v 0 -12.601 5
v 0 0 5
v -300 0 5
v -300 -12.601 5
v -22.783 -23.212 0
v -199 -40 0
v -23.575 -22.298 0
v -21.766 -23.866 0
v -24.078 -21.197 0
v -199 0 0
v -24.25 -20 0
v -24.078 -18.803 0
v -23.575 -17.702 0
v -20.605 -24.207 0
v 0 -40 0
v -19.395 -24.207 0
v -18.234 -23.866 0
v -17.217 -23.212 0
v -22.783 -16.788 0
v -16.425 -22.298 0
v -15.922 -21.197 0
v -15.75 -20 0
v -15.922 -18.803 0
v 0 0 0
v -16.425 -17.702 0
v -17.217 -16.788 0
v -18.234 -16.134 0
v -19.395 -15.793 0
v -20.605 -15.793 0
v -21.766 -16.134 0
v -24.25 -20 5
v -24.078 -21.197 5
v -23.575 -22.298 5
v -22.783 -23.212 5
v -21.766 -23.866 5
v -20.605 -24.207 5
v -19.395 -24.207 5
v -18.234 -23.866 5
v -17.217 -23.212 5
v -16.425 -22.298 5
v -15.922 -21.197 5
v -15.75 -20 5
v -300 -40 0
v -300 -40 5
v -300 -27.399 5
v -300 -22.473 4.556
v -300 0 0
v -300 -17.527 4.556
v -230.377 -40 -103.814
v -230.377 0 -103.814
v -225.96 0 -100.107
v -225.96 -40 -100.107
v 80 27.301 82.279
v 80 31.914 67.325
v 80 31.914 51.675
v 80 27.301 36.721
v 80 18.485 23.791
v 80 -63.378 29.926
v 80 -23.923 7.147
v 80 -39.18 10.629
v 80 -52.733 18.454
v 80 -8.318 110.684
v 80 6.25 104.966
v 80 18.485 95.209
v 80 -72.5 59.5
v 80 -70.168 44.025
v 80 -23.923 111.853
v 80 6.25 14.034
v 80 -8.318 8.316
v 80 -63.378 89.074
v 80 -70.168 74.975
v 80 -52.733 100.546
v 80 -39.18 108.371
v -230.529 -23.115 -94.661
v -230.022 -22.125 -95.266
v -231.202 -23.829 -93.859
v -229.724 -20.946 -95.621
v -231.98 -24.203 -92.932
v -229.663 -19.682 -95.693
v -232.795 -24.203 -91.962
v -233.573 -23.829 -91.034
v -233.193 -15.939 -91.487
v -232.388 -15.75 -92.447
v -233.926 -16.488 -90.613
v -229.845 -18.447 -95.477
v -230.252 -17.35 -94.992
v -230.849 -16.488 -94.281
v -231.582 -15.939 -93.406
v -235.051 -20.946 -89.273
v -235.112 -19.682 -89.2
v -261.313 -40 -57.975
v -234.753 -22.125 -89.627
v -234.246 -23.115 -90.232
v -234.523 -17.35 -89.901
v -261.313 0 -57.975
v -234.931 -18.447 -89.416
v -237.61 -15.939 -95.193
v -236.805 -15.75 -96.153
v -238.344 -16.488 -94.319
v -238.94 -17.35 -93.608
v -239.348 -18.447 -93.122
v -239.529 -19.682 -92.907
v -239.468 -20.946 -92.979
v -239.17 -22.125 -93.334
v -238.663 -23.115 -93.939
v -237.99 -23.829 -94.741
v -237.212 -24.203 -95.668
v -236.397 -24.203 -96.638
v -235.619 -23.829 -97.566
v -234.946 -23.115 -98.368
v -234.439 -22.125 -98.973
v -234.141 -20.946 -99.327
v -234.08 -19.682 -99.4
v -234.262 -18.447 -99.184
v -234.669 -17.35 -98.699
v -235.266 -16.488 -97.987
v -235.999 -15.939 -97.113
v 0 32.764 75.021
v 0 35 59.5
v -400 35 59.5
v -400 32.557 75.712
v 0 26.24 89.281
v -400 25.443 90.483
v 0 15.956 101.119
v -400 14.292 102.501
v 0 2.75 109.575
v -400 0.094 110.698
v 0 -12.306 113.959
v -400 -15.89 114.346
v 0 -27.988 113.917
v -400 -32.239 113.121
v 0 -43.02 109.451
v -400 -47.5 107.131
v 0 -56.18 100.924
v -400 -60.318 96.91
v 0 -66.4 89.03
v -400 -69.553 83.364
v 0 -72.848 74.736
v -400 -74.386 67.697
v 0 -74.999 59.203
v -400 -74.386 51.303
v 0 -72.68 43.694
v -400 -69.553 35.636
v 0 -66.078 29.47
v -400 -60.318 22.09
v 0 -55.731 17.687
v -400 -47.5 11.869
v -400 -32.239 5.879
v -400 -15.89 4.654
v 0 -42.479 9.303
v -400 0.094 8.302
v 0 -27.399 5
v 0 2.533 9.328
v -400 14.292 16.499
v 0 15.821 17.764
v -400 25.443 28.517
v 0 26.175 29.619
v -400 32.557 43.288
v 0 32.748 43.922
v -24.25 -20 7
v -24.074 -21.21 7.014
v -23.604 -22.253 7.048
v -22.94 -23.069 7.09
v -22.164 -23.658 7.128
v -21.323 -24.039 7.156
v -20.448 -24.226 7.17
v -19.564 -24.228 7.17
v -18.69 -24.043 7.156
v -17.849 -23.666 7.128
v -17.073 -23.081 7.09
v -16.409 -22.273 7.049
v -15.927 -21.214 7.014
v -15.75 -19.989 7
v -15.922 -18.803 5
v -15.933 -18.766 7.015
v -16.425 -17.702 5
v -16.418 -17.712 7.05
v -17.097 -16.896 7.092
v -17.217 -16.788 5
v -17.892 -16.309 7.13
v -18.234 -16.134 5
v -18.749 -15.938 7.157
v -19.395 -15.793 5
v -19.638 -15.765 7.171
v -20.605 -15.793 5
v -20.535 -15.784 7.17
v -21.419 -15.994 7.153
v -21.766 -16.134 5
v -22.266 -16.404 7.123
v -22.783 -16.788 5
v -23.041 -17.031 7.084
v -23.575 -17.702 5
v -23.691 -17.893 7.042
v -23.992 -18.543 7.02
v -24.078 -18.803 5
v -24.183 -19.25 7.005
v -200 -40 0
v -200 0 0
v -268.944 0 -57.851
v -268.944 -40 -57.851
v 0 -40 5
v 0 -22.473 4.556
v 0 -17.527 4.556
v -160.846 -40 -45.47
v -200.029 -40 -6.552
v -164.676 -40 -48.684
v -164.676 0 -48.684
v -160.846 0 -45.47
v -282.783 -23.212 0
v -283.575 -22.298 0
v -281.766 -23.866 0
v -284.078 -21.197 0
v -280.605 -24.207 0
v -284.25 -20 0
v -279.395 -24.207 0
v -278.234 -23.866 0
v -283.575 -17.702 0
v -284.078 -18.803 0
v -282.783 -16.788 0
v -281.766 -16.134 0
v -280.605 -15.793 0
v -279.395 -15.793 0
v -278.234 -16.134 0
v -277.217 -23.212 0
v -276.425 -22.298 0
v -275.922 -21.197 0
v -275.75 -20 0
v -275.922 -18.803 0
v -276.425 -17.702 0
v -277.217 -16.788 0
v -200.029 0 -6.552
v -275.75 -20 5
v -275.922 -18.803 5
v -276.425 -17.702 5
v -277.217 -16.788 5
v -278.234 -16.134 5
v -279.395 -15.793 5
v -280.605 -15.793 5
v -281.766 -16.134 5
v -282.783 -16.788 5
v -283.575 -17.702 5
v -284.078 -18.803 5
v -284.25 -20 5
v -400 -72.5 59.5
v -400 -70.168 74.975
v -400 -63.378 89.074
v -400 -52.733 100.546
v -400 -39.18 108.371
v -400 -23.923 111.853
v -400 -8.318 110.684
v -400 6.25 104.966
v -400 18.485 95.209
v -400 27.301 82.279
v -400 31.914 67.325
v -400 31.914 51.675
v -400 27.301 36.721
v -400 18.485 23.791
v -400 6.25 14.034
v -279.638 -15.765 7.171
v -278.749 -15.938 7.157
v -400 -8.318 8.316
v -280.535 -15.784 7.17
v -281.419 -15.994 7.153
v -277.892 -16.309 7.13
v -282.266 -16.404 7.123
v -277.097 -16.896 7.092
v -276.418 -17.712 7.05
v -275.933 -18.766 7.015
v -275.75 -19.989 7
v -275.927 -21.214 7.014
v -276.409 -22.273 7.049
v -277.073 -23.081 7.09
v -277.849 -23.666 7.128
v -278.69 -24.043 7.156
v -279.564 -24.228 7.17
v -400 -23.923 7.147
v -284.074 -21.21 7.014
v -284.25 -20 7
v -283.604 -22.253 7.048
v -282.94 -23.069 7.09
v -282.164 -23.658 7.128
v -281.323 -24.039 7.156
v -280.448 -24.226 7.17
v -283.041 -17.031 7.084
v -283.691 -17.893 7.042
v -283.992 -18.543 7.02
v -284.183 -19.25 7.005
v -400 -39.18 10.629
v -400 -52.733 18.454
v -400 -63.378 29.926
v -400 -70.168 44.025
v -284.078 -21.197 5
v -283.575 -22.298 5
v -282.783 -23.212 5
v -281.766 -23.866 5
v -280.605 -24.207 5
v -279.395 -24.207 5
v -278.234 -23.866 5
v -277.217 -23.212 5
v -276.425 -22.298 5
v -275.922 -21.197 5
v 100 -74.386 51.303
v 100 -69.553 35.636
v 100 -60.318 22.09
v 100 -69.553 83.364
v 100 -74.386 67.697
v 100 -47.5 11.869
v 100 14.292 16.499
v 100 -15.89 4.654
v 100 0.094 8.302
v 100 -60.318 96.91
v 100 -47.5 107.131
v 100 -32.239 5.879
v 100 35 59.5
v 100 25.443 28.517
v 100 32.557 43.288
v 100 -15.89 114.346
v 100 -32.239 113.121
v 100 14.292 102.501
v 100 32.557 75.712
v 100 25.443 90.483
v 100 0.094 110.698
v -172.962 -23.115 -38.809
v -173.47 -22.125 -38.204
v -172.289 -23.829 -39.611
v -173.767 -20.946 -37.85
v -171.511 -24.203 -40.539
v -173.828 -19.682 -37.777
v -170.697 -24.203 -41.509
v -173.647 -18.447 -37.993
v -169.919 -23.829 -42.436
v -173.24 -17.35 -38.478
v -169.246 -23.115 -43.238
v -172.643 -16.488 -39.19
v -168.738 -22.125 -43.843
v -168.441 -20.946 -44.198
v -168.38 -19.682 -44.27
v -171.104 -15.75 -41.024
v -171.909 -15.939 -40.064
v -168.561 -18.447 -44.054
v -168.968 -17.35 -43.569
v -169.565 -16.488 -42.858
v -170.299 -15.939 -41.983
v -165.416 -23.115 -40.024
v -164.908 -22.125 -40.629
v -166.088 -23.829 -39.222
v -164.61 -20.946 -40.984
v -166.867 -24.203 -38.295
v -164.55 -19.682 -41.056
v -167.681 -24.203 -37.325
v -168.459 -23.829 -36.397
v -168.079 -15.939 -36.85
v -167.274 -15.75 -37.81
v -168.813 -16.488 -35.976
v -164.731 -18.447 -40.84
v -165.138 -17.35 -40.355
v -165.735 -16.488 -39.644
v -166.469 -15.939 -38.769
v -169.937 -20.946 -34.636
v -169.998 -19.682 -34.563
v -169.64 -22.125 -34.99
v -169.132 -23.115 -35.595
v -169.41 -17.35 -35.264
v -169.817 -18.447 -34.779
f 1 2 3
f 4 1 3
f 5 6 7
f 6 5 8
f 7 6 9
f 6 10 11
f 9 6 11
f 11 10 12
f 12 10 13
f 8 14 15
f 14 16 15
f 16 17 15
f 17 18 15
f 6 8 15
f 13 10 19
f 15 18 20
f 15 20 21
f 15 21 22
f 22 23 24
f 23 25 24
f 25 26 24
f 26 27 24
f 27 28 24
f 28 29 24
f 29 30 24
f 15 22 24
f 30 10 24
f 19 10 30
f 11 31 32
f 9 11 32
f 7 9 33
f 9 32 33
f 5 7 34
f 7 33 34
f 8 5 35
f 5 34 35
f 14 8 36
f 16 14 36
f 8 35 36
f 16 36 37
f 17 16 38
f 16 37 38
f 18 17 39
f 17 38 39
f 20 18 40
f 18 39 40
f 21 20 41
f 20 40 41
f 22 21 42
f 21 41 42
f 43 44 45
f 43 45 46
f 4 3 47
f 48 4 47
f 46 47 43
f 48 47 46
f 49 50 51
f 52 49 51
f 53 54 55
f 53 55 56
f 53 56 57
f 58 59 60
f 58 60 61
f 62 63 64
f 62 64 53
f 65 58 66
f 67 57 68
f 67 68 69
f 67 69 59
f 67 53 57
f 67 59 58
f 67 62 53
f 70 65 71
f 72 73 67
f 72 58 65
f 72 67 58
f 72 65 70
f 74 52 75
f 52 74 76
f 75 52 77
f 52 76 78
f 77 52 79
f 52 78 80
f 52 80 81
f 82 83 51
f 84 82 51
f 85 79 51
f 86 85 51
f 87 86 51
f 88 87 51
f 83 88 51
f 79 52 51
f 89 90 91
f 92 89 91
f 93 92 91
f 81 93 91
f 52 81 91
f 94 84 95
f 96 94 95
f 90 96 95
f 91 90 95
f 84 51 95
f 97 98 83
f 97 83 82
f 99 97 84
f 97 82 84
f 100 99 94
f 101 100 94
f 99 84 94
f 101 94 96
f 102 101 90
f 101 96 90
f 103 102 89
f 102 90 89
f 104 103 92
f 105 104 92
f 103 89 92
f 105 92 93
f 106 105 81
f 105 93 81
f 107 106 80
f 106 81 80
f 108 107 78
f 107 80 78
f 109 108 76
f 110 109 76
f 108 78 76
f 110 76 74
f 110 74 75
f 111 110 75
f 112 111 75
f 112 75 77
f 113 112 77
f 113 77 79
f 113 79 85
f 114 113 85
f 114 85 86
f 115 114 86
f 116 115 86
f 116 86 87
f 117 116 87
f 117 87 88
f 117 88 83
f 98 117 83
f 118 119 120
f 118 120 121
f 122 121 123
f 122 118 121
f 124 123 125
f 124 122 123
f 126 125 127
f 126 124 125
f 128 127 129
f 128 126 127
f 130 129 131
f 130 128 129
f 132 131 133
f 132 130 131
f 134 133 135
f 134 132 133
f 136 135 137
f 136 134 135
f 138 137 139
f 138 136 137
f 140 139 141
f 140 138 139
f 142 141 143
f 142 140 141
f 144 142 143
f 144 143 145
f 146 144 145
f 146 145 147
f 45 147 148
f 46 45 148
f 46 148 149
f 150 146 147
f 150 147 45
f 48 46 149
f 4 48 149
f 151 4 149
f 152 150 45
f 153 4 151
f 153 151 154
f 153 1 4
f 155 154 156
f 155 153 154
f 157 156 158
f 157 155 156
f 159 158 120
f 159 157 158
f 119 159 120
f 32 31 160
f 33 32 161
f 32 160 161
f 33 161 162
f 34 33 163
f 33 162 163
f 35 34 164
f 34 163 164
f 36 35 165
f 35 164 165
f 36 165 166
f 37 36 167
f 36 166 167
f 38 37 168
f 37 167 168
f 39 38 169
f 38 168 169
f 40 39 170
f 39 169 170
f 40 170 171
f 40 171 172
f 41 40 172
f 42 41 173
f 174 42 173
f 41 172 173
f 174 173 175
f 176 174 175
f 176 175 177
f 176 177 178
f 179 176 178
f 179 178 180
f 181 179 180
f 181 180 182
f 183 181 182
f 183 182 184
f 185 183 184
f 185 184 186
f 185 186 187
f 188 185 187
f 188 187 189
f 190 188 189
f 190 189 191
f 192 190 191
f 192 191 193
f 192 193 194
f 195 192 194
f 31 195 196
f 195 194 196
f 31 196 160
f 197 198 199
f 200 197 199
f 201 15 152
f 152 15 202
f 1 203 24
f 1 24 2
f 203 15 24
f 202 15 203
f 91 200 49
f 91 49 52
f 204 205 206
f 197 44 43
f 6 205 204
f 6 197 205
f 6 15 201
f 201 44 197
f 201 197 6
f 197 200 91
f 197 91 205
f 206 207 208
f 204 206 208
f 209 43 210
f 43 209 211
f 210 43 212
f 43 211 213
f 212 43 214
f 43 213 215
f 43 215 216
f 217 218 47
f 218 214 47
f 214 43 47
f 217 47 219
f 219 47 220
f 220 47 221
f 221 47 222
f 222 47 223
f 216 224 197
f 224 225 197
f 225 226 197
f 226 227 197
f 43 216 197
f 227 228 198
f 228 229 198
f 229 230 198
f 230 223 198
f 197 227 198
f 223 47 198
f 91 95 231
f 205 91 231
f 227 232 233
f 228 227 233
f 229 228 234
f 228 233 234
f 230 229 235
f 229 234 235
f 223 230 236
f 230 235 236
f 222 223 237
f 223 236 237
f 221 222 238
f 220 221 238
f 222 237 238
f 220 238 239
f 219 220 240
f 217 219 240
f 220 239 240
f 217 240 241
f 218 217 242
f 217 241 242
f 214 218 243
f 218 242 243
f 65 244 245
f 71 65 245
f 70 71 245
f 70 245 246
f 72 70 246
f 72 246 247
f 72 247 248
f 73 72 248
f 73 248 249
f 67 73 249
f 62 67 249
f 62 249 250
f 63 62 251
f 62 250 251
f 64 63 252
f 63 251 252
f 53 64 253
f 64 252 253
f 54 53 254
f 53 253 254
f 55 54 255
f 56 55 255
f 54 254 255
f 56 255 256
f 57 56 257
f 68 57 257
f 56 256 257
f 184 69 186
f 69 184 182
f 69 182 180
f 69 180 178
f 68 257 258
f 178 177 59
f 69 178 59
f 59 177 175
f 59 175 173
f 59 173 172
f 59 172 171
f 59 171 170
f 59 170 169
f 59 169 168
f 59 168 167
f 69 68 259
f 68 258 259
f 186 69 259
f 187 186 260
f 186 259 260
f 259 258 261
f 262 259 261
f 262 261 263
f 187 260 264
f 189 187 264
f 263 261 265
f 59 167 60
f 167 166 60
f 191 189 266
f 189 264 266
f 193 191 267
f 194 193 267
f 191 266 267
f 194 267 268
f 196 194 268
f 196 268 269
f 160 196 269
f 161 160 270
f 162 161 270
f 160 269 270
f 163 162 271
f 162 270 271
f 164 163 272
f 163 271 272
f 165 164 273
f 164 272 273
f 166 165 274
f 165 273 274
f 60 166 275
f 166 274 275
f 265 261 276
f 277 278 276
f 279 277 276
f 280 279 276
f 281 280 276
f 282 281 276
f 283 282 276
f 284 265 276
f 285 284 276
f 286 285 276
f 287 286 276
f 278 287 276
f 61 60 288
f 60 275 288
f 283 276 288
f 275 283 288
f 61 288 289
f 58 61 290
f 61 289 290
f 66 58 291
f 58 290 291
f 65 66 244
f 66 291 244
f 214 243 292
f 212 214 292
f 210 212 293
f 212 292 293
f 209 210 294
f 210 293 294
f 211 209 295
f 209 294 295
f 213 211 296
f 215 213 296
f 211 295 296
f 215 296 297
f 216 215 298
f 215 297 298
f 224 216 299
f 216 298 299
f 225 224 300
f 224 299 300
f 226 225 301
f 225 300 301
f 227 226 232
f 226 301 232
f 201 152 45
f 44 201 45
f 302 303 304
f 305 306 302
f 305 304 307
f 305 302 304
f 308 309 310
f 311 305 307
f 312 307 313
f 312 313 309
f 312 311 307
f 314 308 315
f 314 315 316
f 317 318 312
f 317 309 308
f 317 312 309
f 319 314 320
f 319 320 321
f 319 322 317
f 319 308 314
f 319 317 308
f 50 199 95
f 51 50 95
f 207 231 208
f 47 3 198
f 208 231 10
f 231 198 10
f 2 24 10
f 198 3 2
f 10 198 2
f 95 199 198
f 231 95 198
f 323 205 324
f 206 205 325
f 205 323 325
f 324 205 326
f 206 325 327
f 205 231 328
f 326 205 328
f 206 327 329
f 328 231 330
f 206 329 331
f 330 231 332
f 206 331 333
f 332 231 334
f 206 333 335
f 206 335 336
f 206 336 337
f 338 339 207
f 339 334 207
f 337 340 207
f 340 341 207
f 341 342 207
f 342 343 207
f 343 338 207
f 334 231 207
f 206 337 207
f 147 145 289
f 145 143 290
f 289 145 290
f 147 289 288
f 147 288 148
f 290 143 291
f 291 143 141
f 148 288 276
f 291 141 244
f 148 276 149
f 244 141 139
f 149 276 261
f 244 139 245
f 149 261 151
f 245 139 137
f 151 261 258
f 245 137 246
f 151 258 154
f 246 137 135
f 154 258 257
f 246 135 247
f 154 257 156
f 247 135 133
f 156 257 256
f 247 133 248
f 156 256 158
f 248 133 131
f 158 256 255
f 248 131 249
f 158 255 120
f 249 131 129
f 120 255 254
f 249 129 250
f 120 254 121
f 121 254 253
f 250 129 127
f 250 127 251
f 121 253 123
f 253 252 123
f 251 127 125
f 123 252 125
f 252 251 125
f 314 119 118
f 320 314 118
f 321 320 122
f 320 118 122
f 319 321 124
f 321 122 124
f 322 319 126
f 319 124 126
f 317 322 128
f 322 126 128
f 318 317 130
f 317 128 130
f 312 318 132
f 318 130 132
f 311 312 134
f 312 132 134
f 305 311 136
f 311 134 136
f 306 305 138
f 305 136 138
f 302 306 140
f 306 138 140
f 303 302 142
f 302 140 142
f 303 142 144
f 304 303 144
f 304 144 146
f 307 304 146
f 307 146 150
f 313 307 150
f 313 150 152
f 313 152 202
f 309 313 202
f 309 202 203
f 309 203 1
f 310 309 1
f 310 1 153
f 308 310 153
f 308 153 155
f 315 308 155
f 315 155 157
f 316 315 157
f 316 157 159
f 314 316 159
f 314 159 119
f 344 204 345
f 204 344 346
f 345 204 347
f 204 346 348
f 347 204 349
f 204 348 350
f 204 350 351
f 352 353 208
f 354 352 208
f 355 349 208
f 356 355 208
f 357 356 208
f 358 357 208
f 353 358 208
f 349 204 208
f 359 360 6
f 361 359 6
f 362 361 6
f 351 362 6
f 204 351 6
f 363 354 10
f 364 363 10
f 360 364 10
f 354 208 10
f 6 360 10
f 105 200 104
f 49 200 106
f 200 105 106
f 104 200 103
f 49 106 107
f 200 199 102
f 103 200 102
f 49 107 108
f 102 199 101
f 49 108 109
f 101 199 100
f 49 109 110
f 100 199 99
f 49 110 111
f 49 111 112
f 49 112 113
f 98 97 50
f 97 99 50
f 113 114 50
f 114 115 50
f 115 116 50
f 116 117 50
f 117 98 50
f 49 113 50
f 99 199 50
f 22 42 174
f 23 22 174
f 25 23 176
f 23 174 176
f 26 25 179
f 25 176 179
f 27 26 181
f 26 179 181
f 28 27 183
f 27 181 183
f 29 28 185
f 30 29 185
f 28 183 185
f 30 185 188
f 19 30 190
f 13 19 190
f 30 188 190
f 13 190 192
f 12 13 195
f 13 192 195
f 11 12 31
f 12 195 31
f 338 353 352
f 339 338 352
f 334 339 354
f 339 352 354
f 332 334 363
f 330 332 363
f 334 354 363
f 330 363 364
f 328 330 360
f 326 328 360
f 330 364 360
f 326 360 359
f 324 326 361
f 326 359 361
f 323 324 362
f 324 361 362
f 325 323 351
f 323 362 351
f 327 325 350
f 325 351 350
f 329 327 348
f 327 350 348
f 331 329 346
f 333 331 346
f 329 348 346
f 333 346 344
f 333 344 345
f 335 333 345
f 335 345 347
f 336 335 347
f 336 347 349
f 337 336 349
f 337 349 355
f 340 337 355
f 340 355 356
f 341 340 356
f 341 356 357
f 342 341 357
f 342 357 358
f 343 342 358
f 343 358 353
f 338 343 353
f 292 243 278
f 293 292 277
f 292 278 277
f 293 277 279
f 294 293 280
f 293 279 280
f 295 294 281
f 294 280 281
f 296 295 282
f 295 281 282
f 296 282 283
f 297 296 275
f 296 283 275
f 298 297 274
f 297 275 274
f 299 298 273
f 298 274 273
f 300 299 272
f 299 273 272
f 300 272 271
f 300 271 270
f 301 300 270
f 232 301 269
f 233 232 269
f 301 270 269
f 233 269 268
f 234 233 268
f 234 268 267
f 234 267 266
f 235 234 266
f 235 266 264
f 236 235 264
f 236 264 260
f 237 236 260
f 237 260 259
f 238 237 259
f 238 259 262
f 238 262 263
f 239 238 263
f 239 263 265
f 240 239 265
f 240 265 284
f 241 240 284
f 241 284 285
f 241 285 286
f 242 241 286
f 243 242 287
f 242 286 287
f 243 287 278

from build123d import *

# Parameters (mm, degrees)
F1_DEPTH      = 40
F4_D          = 8.5
F4_DEPTH      = 100
F4_TIP        = 2.5536576309
F5_R          = 55
F6_DEPTH      = 100
F6_DEPTH_BACK = 400
F7_R          = 52.5
F8_DEPTH      = 480
F9_D          = 8.5
F9_DEPTH      = 30
F9_TIP        = 2.5536576309
F10_D         = 8.5
F10_DEPTH     = 30
F10_TIP       = 2.5536576309


with BuildPart() as f1:
    # F0 (on Front) → F1 (new body)
    with BuildSketch(Plane.XZ):
        Polygon((-199, 0), (0, 0), (0, 5), (-300, 5), (-300, 0), (-200, 0), (-268.9439998807, -57.8508848718), (-230.3767432995, -103.8135514589), (-225.9596969951, -100.107209534), (-261.3130155278, -57.9747651624), (-200.0294600783, -6.5517563875), (-164.6761415456, -48.6842007591), (-160.84591933, -45.4702627106), align=None)
    extrude(amount=F1_DEPTH)

    # F4
    with Locations(Plane(origin=(-186.3088176474, 0, -156.331660173), x_dir=(0, -1, 0), z_dir=(-0.7660444431, 0, -0.6427876097))):
        with Locations((20, 78.5575219373)):
            Hole(F4_D / 2, depth=F4_DEPTH)
            with Locations((0, 0, -(F4_DEPTH + F4_TIP / 2))):  # 118° drill point
                Cone(0, F4_D / 2, F4_TIP, mode=Mode.SUBTRACT)

    # F5 (on Right) → F6 (join, two sides)
    with BuildSketch(Plane.YZ) as f6_sk:
        with Locations((-20, 59.5)):
            Circle(F5_R)
    extrude(amount=F6_DEPTH)
    extrude(f6_sk.sketch, amount=-F6_DEPTH_BACK)

    # F7 (on face) → F8 (cut)
    with BuildSketch(Plane(origin=(-400, 0, 0), x_dir=(0, -1, 0), z_dir=(-1, 0, 0))):
        with Locations((20, 59.5)):
            Circle(F7_R)
    extrude(amount=-F8_DEPTH, mode=Mode.SUBTRACT)

    # F9 (one way)
    with BuildSketch(Plane.XY.offset(5)):
        with Locations((-280, -20), (-20, -20)):
            Circle(F9_D / 2)
    extrude(amount=-F9_DEPTH, mode=Mode.SUBTRACT)
    with Locations(Plane.XY.offset(5)):
        with Locations((-280, -20), (-20, -20)):
            with Locations((0, 0, -(F9_DEPTH + F9_TIP / 2))):  # 118° drill point
                Cone(0, F9_D / 2, F9_TIP, mode=Mode.SUBTRACT)

    # F10
    with Locations(Plane(origin=(0, 0, 5), x_dir=(1, 0, 0), z_dir=(0, 0, -1))):
        with Locations((-280, 20), (-20, 20)):
            Hole(F10_D / 2, depth=F10_DEPTH)
            with Locations((0, 0, -(F10_DEPTH + F10_TIP / 2))):  # 118° drill point
                Cone(0, F10_D / 2, F10_TIP, mode=Mode.SUBTRACT)


solid = f1.part
